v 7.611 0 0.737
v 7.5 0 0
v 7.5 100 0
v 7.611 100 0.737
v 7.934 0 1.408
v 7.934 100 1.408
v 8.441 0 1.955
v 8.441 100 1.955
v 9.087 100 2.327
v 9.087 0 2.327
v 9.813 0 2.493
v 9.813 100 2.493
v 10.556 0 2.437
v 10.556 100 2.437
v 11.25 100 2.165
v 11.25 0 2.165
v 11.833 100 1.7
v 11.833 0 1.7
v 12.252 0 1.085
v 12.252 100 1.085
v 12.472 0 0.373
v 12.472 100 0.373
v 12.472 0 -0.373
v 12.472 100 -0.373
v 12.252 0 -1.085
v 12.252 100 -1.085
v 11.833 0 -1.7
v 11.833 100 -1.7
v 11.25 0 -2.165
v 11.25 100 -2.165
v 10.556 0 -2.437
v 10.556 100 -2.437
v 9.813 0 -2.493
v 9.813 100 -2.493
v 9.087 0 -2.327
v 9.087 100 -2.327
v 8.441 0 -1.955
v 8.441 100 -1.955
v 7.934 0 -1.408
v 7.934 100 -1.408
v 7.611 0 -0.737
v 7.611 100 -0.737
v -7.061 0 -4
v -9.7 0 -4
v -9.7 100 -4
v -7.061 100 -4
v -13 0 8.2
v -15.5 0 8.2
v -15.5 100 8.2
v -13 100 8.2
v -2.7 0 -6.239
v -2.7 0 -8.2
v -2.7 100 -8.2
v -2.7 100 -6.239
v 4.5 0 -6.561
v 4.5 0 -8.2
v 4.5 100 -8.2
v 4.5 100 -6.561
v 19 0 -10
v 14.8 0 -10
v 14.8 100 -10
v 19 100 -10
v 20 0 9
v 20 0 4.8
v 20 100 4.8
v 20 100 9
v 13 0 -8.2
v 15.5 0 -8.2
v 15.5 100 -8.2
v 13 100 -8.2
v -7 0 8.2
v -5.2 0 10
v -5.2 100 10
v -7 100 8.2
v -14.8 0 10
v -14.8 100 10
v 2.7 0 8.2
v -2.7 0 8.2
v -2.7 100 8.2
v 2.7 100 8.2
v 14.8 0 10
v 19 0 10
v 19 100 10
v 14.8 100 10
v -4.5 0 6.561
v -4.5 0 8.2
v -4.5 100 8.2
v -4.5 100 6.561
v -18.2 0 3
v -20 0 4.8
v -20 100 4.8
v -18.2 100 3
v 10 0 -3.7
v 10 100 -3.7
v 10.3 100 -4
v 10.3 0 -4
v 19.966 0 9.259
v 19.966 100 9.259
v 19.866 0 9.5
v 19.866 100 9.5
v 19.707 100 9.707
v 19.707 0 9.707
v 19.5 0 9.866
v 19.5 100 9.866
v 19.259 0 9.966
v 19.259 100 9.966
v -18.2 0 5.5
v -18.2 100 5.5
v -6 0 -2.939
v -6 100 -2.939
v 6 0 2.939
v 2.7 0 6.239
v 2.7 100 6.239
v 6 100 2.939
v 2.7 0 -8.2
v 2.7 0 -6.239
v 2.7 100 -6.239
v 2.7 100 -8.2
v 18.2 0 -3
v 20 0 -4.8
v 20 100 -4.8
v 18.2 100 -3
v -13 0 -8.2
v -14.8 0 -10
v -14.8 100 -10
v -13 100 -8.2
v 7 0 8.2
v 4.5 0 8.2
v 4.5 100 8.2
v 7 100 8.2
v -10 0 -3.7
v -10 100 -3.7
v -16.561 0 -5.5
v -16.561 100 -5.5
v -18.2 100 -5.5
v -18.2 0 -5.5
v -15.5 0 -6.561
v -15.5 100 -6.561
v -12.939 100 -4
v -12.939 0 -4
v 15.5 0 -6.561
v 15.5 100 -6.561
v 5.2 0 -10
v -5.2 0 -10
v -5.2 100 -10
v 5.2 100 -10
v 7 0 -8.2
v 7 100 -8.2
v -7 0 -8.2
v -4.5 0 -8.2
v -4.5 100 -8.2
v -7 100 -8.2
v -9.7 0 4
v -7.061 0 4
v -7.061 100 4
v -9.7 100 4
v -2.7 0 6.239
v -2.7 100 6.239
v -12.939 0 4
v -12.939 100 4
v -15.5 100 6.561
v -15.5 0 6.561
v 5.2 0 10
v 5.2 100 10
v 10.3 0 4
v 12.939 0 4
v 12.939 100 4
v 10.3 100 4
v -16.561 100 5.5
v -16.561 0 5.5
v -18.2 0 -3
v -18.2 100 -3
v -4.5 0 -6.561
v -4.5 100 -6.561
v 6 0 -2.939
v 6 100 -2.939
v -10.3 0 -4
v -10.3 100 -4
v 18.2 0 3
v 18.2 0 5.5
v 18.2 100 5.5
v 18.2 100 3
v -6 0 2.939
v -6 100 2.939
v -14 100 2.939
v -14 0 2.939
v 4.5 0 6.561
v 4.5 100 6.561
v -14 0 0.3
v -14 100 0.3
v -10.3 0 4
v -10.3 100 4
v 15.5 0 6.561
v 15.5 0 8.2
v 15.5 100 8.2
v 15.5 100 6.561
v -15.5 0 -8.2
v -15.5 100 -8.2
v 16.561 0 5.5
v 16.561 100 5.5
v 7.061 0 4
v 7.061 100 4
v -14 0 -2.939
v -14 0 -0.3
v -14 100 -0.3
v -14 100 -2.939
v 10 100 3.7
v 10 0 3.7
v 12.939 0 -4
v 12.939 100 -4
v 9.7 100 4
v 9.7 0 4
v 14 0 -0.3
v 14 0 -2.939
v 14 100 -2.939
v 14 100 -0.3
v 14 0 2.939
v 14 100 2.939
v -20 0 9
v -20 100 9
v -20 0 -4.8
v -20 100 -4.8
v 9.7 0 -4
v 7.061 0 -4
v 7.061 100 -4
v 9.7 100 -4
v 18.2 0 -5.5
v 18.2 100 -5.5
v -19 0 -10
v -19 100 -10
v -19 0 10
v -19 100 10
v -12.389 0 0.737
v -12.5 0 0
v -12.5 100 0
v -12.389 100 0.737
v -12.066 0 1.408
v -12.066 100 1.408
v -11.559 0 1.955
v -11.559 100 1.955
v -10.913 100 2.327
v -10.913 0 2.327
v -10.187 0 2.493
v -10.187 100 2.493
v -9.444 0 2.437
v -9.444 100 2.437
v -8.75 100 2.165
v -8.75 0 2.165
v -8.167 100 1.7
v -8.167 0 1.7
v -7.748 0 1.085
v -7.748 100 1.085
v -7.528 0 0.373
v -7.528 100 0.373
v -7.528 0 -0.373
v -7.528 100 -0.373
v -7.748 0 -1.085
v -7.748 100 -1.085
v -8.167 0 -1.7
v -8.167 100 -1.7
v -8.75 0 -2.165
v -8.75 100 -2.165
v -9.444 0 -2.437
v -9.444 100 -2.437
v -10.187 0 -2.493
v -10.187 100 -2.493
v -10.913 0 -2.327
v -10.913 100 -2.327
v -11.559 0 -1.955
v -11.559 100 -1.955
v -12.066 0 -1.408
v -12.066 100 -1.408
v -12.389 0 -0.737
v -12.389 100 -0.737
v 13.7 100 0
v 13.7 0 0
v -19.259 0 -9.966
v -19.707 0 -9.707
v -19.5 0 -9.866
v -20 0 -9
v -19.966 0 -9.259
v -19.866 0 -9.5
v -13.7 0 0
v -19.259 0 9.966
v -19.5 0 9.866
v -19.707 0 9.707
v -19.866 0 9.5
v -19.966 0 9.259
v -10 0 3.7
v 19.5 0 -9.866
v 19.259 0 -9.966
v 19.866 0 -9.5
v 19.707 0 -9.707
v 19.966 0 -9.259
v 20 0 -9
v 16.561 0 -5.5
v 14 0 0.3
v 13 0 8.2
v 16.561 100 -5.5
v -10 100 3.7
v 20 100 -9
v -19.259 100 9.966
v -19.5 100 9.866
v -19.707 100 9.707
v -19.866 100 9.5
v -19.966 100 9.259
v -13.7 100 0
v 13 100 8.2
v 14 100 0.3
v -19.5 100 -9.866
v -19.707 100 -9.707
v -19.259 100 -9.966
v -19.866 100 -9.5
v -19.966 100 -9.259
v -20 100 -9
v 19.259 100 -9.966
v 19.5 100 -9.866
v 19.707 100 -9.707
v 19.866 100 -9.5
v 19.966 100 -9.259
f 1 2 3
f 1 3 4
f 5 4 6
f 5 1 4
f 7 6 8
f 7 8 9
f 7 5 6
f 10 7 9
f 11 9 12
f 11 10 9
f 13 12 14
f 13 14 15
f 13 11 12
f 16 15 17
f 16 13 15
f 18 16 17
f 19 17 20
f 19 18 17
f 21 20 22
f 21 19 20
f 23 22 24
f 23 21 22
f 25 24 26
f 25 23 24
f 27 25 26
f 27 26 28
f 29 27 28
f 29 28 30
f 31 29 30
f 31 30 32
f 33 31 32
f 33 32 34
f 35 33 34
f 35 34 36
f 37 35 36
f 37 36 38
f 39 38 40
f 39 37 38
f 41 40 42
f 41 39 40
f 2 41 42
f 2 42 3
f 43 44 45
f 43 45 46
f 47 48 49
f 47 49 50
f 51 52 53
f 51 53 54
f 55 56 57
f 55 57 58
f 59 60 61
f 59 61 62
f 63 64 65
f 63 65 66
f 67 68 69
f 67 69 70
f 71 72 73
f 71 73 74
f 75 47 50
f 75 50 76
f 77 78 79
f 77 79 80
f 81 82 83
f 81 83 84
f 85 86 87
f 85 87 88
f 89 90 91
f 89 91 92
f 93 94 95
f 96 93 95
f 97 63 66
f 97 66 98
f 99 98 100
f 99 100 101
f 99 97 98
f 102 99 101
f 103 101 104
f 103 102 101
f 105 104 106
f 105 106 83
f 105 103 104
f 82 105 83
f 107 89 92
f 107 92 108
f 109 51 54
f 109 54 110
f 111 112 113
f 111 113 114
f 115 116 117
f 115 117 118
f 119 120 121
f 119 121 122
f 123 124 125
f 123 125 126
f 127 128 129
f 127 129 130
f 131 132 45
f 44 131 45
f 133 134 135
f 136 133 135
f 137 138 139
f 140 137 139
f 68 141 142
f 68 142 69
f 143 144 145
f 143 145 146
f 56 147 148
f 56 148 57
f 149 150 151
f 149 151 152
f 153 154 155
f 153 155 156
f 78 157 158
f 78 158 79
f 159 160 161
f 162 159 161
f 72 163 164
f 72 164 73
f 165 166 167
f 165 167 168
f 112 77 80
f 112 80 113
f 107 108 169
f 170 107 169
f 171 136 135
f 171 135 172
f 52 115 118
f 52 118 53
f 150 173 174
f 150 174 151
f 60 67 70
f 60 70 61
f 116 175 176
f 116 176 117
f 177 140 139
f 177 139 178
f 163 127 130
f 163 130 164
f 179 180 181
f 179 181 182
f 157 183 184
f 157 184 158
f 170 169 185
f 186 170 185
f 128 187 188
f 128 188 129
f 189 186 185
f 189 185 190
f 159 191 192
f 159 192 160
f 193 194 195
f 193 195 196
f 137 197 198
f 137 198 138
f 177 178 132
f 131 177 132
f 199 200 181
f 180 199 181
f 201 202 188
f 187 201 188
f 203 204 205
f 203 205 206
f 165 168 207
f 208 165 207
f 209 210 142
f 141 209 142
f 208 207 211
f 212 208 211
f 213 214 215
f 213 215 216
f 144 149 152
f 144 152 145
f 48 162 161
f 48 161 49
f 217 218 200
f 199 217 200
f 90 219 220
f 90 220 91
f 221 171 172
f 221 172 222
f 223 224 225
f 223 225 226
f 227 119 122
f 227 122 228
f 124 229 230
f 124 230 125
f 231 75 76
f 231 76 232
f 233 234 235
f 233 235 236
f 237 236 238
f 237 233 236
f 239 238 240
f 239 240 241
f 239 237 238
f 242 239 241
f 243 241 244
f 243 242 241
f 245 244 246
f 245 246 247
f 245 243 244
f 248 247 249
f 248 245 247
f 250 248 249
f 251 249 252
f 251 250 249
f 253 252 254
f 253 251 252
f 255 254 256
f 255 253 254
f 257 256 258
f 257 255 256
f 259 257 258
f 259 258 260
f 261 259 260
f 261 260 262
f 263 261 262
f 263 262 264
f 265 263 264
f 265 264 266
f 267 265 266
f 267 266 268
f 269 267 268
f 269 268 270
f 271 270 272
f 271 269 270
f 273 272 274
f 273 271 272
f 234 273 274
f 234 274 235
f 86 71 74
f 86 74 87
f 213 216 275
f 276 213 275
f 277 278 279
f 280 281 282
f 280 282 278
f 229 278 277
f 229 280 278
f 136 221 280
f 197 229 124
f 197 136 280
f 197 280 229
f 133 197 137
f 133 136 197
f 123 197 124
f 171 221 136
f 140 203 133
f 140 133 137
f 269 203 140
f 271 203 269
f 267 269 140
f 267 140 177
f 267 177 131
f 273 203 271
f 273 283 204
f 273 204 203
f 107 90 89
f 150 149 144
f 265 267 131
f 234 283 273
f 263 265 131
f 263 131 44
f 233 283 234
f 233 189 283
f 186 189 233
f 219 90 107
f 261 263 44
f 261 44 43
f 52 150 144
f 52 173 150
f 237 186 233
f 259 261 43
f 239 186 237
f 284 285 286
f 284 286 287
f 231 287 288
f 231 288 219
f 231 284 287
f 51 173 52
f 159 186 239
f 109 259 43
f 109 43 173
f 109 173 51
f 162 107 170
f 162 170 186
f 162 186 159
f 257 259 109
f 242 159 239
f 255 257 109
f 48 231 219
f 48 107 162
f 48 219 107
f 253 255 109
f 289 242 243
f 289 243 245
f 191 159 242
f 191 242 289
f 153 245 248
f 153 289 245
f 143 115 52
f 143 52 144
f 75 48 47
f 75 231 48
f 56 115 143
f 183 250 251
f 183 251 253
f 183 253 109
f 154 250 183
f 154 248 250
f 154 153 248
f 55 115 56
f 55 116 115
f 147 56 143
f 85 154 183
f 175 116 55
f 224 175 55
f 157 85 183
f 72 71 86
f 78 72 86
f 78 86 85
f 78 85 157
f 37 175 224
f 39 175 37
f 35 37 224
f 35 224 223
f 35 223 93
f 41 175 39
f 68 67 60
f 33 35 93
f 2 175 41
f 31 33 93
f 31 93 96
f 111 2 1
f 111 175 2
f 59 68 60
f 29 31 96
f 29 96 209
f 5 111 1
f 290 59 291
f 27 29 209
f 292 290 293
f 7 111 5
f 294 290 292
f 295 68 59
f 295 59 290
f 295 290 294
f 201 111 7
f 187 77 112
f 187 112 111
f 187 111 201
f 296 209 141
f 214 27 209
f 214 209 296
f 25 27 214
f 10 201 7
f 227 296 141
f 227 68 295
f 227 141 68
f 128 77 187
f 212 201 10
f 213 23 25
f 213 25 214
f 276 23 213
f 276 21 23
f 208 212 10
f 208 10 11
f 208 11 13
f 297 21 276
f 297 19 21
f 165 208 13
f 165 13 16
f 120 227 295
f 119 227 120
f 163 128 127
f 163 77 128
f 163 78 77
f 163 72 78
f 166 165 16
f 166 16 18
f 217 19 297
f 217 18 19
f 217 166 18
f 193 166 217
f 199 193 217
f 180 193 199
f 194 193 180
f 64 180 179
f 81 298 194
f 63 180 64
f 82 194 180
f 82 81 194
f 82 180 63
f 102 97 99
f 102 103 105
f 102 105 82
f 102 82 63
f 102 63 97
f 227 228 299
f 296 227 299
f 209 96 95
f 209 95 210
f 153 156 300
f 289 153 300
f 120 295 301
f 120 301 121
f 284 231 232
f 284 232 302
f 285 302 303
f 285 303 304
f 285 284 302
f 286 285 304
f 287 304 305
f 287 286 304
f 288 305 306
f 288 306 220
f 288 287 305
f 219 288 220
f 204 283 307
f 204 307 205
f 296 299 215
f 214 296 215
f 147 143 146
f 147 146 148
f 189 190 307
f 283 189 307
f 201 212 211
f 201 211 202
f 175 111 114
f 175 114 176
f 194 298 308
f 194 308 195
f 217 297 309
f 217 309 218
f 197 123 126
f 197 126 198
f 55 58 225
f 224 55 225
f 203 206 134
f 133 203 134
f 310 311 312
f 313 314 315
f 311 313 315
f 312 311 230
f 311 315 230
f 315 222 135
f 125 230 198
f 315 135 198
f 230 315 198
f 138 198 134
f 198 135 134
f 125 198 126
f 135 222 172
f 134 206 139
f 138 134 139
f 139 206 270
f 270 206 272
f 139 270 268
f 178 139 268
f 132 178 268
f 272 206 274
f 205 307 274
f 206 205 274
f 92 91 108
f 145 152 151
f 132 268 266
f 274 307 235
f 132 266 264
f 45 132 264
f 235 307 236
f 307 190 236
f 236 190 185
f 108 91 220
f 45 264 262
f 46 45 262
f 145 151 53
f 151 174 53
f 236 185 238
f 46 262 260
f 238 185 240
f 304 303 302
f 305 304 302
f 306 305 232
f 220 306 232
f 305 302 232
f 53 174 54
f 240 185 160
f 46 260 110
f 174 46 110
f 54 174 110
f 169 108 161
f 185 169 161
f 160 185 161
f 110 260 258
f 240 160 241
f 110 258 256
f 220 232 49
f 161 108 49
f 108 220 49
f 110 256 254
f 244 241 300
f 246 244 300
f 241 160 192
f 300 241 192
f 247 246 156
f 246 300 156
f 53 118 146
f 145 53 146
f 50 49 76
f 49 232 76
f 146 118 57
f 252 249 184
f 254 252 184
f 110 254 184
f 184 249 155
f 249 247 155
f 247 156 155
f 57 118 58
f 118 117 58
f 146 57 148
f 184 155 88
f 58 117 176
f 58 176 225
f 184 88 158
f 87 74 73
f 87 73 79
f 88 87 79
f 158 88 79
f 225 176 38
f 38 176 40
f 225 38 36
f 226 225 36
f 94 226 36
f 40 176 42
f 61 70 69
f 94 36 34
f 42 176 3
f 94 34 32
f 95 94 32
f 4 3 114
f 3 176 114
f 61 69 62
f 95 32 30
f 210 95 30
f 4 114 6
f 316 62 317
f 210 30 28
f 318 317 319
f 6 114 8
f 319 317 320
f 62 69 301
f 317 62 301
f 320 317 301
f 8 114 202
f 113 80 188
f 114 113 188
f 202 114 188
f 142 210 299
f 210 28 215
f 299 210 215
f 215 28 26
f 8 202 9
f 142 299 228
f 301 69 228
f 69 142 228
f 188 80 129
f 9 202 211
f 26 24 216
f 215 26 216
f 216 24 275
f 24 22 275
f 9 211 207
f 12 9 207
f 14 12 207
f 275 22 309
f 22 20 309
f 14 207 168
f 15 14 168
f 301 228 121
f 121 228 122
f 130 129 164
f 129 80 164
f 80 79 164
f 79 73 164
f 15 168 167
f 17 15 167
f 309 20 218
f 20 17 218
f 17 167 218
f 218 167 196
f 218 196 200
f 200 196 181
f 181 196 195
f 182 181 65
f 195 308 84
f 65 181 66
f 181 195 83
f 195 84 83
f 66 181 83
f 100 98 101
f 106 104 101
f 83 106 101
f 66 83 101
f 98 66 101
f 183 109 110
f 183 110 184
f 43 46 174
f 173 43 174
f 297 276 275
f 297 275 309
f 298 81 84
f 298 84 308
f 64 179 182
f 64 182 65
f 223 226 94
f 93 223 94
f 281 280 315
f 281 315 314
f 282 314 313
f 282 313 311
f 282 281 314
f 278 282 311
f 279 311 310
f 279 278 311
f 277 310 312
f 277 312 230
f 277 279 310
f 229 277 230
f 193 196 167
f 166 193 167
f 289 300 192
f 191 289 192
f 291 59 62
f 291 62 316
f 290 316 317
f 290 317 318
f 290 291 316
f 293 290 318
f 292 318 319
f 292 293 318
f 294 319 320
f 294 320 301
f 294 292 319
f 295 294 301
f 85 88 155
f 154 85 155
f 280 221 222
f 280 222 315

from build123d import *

# Parameters (mm, degrees)
SKETCH13_R                                  = 2.5
RETANGULAR_PF20_12_PERFIL_2040_V_SLOT_DEPTH = 100


with BuildPart() as part:
    # Sketch13 → Retangular PF20-12 - PERFIL 2040 V-SLOT(1) (new body)
    with BuildSketch(Plane(origin=(0, 0, 0), x_dir=(-1, 0, 0), z_dir=(0, 1, 0))):
        with BuildLine():
            Line((-14.8, 10), (-13, 8.2))
            Line((-13, 8.2), (-15.5, 8.2))
            Line((-15.5, 8.2), (-15.5, 6.560660172))
            Line((-15.5, 6.560660172), (-12.939339828, 4))
            Line((-12.939339828, 4), (-10.3, 4))
            Line((-10.3, 4), (-10, 3.7))
            Line((-10, 3.7), (-9.7, 4))
            Line((-9.7, 4), (-7.060660172, 4))
            Line((-7.060660172, 4), (-4.5, 6.560660172))
            Line((-4.5, 6.560660172), (-4.5, 8.2))
            Line((-4.5, 8.2), (-7, 8.2))
            Line((-7, 8.2), (-5.2, 10))
            Line((-5.2, 10), (5.2, 10))
            Line((5.2, 10), (7, 8.2))
            Line((7, 8.2), (4.5, 8.2))
            Line((4.5, 8.2), (4.5, 6.560660172))
            Line((4.5, 6.560660172), (7.060660172, 4))
            Line((7.060660172, 4), (9.7, 4))
            Line((9.7, 4), (10, 3.7))
            Line((10, 3.7), (10.3, 4))
            Line((10.3, 4), (12.939339828, 4))
            Line((12.939339828, 4), (15.5, 6.560660172))
            Line((15.5, 6.560660172), (15.5, 8.2))
            Line((15.5, 8.2), (13, 8.2))
            Line((13, 8.2), (14.8, 10))
            Line((14.8, 10), (19, 10))
            ThreePointArc((19, 10), (19.707106781, 9.707106781), (20, 9))
            Line((20, 9), (20, 4.8))
            Line((20, 4.8), (18.2, 3))
            Line((18.2, 3), (18.2, 5.5))
            Line((18.2, 5.5), (16.560660172, 5.5))
            Line((16.560660172, 5.5), (14, 2.939339828))
            Line((14, 2.939339828), (14, 0.3))
            Line((14, 0.3), (13.7, 0))
            Line((13.7, 0), (14, -0.3))
            Line((14, -0.3), (14, -2.939339828))
            Line((14, -2.939339828), (16.560660172, -5.5))
            Line((16.560660172, -5.5), (18.2, -5.5))
            Line((18.2, -5.5), (18.2, -3))
            Line((18.2, -3), (20, -4.8))
            Line((20, -4.8), (20, -9))
            ThreePointArc((20, -9), (19.707106781, -9.707106781), (19, -10))
            Line((19, -10), (14.8, -10))
            Line((14.8, -10), (13, -8.2))
            Line((13, -8.2), (15.5, -8.2))
            Line((15.5, -8.2), (15.5, -6.560660172))
            Line((15.5, -6.560660172), (12.939339828, -4))
            Line((12.939339828, -4), (10.3, -4))
            Line((10.3, -4), (10, -3.7))
            Line((10, -3.7), (9.7, -4))
            Line((9.7, -4), (7.060660172, -4))
            Line((7.060660172, -4), (4.5, -6.560660172))
            Line((4.5, -6.560660172), (4.5, -8.2))
            Line((4.5, -8.2), (7, -8.2))
            Line((7, -8.2), (5.2, -10))
            Line((5.2, -10), (-5.2, -10))
            Line((-5.2, -10), (-7, -8.2))
            Line((-7, -8.2), (-4.5, -8.2))
            Line((-4.5, -8.2), (-4.5, -6.560660172))
            Line((-4.5, -6.560660172), (-7.060660172, -4))
            Line((-7.060660172, -4), (-9.7, -4))
            Line((-9.7, -4), (-10, -3.7))
            Line((-10, -3.7), (-10.3, -4))
            Line((-10.3, -4), (-12.939339828, -4))
            Line((-12.939339828, -4), (-15.5, -6.560660172))
            Line((-15.5, -6.560660172), (-15.5, -8.2))
            Line((-15.5, -8.2), (-13, -8.2))
            Line((-13, -8.2), (-14.8, -10))
            Line((-14.8, -10), (-19, -10))
            ThreePointArc((-19, -10), (-19.707106781, -9.707106781), (-20, -9))
            Line((-20, -9), (-20, -4.8))
            Line((-20, -4.8), (-18.2, -3))
            Line((-18.2, -3), (-18.2, -5.5))
            Line((-18.2, -5.5), (-16.560660172, -5.5))
            Line((-16.560660172, -5.5), (-14, -2.939339828))
            Line((-14, -2.939339828), (-14, -0.3))
            Line((-14, -0.3), (-13.7, 0))
            Line((-13.7, 0), (-14, 0.3))
            Line((-14, 0.3), (-14, 2.939339828))
            Line((-14, 2.939339828), (-16.560660172, 5.5))
            Line((-16.560660172, 5.5), (-18.2, 5.5))
            Line((-18.2, 5.5), (-18.2, 3))
            Line((-18.2, 3), (-20, 4.8))
            Line((-20, 4.8), (-20, 9))
            ThreePointArc((-20, 9), (-19.707106781, 9.707106781), (-19, 10))
            Line((-19, 10), (-14.8, 10))
        make_face()
        with Locations((-10, 0)):
            Circle(SKETCH13_R, mode=Mode.SUBTRACT)
        with Locations((10, 0)):
            Circle(SKETCH13_R, mode=Mode.SUBTRACT)
        Polygon((-2.7, 8.2), (-2.7, 6.239339828), (-6, 2.939339828), (-6, -2.939339828), (-2.7, -6.239339828), (-2.7, -8.2), (2.7, -8.2), (2.7, -6.239339828), (6, -2.939339828), (6, 2.939339828), (2.7, 6.239339828), (2.7, 8.2), align=None, mode=Mode.SUBTRACT)
    extrude(amount=RETANGULAR_PF20_12_PERFIL_2040_V_SLOT_DEPTH)


solid = part.part
